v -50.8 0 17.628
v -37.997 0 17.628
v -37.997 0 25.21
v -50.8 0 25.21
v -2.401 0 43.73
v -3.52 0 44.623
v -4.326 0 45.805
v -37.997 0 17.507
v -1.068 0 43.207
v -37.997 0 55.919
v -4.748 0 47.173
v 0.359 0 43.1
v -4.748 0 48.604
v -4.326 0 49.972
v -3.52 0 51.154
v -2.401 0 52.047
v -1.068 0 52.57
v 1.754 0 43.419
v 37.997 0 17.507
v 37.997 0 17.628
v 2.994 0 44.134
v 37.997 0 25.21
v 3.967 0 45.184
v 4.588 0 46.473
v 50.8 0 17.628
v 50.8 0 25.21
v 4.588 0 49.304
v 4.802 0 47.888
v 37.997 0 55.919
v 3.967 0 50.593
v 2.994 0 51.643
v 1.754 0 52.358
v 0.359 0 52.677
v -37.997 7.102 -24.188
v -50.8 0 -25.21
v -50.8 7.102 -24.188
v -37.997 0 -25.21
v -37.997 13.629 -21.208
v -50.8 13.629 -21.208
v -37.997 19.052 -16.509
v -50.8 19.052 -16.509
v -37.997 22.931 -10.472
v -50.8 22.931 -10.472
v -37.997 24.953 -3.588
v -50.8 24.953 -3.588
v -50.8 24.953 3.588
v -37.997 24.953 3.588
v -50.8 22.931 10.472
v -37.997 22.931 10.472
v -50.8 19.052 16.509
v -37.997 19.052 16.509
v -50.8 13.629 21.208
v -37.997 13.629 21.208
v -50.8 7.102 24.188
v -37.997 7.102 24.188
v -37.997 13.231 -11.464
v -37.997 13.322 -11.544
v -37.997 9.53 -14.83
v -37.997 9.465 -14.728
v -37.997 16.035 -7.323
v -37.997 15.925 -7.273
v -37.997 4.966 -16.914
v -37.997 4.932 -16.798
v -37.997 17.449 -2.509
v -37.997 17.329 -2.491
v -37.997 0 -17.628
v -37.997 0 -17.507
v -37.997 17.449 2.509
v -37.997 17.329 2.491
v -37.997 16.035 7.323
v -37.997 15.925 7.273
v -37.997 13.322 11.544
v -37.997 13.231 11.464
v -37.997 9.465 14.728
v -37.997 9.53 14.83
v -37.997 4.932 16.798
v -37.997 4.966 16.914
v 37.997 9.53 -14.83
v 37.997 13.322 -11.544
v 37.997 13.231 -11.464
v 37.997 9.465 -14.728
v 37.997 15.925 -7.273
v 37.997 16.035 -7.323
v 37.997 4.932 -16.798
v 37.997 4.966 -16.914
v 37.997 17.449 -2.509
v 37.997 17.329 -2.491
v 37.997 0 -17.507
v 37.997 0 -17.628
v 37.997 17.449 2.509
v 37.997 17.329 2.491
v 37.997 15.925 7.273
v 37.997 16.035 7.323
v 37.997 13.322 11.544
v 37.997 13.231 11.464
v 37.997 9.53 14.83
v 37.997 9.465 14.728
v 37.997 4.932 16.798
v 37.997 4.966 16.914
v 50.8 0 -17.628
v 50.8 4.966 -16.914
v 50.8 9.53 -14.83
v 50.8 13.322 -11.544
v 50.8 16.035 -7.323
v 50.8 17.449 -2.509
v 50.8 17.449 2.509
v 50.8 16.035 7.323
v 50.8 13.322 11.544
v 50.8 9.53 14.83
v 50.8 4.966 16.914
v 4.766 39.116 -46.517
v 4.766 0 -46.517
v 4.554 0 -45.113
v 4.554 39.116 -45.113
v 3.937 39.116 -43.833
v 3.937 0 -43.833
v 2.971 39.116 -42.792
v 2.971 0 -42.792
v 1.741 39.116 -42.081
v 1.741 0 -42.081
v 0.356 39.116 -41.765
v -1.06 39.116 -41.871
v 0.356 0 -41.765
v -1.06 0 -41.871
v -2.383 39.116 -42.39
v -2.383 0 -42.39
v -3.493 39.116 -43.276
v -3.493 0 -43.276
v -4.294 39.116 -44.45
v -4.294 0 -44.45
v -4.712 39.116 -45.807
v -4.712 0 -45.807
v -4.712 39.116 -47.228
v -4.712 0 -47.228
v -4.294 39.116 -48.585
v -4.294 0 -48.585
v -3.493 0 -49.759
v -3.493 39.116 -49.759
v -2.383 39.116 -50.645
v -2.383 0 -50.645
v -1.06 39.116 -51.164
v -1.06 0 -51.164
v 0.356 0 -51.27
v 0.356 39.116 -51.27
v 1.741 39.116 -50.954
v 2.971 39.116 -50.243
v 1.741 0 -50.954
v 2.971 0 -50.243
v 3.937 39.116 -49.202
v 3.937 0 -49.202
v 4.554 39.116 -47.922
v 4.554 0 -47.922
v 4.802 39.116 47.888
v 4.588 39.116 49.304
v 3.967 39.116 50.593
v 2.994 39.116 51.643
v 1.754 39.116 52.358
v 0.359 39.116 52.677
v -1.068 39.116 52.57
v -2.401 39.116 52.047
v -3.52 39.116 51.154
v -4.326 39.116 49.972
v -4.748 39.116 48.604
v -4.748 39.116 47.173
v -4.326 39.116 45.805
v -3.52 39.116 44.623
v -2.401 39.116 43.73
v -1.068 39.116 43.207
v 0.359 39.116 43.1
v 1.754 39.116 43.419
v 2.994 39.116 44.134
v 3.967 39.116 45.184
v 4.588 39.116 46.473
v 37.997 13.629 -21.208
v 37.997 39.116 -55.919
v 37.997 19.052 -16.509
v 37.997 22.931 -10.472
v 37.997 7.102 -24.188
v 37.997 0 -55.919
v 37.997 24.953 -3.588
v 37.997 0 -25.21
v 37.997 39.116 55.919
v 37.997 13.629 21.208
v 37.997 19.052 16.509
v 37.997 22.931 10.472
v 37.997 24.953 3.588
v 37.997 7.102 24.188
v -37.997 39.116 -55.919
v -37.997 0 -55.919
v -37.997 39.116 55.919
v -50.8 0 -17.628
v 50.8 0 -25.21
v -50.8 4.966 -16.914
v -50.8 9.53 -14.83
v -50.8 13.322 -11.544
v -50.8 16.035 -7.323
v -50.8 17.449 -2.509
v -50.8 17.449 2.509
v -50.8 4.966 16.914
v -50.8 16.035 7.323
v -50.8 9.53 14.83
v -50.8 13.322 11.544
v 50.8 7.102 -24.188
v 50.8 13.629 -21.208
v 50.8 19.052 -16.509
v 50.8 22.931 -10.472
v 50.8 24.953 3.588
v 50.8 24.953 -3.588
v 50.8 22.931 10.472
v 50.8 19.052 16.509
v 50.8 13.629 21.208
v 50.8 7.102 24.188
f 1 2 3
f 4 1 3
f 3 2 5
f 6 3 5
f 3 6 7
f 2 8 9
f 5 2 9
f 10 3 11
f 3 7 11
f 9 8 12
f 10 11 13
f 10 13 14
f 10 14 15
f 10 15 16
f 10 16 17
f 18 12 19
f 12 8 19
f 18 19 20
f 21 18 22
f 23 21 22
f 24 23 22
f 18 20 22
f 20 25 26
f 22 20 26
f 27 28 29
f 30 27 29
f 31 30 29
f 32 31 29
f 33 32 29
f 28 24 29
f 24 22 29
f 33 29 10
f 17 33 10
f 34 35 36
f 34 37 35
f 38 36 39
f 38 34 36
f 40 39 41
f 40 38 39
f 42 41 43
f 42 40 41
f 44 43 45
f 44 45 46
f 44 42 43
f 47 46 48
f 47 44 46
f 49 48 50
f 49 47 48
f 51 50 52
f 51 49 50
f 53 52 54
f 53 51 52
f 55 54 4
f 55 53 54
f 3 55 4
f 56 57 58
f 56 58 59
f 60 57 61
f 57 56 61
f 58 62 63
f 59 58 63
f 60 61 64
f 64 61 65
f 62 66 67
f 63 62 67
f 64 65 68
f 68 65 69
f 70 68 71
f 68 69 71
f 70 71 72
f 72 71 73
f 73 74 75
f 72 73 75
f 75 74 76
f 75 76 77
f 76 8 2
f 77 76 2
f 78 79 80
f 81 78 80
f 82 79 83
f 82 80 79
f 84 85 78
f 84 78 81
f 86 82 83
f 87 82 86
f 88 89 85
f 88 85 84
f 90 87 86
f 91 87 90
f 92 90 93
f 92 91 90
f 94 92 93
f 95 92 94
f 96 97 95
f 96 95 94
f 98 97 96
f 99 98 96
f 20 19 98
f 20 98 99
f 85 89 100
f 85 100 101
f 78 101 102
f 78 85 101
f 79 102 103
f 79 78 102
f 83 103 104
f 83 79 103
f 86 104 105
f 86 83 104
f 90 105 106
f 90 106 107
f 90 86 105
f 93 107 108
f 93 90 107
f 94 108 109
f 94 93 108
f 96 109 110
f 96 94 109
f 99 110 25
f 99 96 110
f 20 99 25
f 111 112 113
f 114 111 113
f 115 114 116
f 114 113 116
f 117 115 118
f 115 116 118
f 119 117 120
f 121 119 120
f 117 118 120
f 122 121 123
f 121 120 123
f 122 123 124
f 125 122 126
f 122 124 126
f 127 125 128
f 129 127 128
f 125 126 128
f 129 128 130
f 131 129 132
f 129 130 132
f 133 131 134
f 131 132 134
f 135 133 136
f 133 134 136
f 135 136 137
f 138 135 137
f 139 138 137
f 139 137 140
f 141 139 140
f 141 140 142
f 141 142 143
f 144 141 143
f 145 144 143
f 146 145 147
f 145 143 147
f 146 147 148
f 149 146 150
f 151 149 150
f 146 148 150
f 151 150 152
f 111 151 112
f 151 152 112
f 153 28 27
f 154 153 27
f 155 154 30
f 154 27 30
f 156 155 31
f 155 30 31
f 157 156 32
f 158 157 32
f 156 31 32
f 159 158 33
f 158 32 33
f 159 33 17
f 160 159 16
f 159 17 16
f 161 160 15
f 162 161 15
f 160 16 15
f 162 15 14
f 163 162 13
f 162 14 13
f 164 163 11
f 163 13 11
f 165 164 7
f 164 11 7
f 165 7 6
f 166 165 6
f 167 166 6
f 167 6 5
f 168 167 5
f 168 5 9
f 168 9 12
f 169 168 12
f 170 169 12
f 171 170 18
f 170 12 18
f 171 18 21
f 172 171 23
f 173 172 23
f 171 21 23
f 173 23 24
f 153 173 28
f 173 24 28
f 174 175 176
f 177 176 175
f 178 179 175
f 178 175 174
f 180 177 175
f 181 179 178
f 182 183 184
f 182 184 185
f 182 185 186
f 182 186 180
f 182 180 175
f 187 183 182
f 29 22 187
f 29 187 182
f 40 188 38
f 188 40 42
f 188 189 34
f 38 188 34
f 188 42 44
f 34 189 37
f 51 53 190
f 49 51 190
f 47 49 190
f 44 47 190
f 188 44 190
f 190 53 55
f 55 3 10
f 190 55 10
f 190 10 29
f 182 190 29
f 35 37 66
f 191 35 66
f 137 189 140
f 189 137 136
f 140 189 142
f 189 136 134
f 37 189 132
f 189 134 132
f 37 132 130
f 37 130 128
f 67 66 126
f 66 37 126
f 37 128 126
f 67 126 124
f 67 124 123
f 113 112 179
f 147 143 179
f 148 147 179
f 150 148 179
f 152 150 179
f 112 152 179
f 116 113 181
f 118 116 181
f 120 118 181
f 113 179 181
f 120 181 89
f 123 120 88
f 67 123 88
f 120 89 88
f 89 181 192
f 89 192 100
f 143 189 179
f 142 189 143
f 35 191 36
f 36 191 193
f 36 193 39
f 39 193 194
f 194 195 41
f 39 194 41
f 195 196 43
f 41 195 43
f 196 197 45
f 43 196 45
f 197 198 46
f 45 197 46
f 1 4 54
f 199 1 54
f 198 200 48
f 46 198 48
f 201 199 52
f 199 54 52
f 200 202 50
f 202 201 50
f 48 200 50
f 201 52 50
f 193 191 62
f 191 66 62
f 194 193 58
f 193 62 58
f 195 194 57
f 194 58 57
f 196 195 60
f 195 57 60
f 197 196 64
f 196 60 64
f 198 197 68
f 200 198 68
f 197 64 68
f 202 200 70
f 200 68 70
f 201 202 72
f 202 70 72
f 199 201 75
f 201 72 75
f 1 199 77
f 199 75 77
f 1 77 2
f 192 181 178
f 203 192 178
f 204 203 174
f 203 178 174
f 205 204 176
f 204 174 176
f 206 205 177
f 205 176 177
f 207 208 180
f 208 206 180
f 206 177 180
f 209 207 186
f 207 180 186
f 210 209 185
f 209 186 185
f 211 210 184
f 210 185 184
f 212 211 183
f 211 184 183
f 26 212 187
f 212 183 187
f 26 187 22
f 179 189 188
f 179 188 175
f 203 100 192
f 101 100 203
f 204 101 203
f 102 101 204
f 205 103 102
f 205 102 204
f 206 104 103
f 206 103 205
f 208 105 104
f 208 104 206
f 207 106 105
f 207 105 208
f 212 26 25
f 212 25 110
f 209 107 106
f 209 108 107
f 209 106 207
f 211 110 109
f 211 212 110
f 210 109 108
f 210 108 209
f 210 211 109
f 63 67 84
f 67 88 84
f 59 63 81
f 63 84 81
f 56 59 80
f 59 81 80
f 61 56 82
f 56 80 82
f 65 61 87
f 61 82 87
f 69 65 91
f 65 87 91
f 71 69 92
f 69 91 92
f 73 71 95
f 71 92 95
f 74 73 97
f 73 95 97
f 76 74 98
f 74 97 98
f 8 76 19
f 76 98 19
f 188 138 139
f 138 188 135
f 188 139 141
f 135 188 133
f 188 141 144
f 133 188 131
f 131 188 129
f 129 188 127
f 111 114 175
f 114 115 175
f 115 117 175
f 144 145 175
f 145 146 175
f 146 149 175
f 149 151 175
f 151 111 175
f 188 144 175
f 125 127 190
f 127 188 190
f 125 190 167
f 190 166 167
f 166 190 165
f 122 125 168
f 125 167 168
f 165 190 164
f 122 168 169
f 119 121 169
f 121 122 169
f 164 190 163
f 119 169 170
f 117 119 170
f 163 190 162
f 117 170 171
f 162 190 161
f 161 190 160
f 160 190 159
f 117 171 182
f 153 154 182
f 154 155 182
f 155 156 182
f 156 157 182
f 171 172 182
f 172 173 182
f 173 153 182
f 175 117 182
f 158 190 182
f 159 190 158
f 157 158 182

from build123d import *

# Parameters (mm, degrees)
F0_W          = 75.9948119521
F0_H          = 111.8377298117
F0_R          = 4.7655494626
F0_R_2        = 4.8016385214
F1_DEPTH      = 39.116
F2_R          = 25.2095031521
F2_R_2        = 17.6279340775
F3_DEPTH      = 50.8
F3_DEPTH_BACK = 50.8
F4_R          = 17.506739517
F5_DEPTH      = 77.978
F5_DEPTH_BACK = 76.962
F6_W          = 38.5849960148
F6_H          = 51.1202197522
F7_DEPTH      = 50.8
F7_DEPTH_BACK = 50.8


with BuildPart() as f1:
    # F0 (on Front) → F1 (new body)
    with BuildSketch(Plane.XZ):
        Rectangle(F0_W, F0_H)
        with Locations((0, -46.5174391866)):
            Circle(F0_R, mode=Mode.SUBTRACT)
        with Locations((0, 47.8884801269)):
            Circle(F0_R_2, mode=Mode.SUBTRACT)
    extrude(amount=-F1_DEPTH)

    # F2 (on Right) → F3 (join, two sides)
    with BuildSketch(Plane.YZ) as f3_sk:
        Circle(F2_R)
        Circle(F2_R_2, mode=Mode.SUBTRACT)
    extrude(amount=F3_DEPTH)
    extrude(f3_sk.sketch, amount=-F3_DEPTH_BACK)

    # F4 (on Right) → F5 (cut, two sides)
    with BuildSketch(Plane.YZ) as f5_sk:
        Circle(F4_R)
    extrude(amount=-F5_DEPTH, mode=Mode.SUBTRACT)
    extrude(f5_sk.sketch, amount=F5_DEPTH_BACK, mode=Mode.SUBTRACT)

    # F6 (on Right) → F7 (cut, two sides)
    with BuildSketch(Plane.YZ) as f7_sk:
        with Locations((-19.2924980074, 9.313e-07)):
            Rectangle(F6_W, F6_H)
    extrude(amount=-F7_DEPTH, mode=Mode.SUBTRACT)
    extrude(f7_sk.sketch, amount=F7_DEPTH_BACK, mode=Mode.SUBTRACT)


solid = f1.part
